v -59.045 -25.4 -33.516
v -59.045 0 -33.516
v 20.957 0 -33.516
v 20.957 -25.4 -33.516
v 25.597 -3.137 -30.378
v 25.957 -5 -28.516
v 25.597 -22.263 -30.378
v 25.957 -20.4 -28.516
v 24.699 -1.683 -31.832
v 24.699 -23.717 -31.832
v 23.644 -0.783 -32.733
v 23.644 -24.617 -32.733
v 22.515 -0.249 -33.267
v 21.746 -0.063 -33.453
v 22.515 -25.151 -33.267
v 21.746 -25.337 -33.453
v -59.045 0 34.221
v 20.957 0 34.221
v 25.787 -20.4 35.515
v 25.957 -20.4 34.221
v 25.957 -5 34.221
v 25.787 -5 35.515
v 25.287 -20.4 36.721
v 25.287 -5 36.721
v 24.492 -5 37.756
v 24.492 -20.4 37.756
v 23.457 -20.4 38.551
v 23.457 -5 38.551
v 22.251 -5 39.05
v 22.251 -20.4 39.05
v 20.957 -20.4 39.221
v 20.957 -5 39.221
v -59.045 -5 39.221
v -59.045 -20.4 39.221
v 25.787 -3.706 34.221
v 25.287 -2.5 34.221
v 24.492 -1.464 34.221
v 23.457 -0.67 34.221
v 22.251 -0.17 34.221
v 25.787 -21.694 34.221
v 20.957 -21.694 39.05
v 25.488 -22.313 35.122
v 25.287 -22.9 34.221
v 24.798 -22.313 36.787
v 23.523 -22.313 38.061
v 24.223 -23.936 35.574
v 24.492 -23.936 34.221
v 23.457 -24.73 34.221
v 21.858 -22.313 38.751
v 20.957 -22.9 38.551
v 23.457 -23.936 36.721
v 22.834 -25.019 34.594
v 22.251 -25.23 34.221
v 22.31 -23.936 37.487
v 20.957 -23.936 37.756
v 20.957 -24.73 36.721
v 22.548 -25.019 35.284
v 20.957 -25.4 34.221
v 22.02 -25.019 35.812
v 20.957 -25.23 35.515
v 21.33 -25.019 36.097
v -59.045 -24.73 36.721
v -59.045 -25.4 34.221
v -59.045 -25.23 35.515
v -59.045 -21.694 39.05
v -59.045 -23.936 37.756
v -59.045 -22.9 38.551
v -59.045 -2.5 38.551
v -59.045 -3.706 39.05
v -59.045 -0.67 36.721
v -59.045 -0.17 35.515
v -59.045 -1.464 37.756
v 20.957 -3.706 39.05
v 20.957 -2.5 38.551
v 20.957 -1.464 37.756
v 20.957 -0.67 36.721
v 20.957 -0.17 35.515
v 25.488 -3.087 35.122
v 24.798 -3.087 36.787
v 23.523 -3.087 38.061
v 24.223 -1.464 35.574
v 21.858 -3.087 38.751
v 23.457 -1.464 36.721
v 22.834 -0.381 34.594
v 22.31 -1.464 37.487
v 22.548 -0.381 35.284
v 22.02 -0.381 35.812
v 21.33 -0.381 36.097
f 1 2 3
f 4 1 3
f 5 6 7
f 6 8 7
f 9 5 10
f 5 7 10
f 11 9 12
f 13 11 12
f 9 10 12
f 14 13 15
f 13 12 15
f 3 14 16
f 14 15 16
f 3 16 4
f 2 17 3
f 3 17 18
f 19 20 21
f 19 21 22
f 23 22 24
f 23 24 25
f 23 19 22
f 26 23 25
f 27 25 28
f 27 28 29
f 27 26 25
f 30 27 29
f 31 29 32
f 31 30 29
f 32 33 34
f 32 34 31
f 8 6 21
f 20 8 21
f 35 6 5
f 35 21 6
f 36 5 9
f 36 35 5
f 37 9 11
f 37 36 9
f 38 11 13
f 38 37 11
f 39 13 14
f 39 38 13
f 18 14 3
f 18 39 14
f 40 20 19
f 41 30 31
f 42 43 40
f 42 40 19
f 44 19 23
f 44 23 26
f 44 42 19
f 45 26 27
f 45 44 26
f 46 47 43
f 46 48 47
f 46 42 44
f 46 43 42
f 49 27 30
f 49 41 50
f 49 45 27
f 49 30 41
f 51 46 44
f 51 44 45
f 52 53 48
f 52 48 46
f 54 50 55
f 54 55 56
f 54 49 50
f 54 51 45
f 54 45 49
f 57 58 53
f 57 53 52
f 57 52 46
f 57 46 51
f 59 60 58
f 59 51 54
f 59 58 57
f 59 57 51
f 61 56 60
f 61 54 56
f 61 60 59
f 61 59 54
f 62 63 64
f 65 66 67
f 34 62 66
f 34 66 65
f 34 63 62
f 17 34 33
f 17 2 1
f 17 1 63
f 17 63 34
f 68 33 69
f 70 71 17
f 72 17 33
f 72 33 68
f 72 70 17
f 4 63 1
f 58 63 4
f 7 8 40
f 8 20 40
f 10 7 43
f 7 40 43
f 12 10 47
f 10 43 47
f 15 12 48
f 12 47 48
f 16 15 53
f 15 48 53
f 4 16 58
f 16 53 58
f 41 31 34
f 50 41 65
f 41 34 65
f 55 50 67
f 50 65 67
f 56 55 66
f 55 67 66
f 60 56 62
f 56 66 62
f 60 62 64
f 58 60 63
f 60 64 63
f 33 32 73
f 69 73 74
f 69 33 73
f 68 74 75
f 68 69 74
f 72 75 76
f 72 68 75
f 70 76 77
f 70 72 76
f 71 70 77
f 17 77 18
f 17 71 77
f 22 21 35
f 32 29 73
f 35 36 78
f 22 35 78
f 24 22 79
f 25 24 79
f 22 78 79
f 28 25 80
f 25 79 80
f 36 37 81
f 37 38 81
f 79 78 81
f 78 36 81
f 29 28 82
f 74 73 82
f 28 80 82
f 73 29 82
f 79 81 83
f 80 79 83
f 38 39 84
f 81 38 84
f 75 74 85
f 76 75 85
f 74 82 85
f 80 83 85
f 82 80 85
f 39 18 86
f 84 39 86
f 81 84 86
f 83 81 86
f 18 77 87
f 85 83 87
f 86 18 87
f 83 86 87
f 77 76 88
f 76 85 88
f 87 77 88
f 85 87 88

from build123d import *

# Parameters (mm, degrees)
F0_W     = 85.001712665
F0_H     = 72.736363858
F1_DEPTH = 25.4
F2_R     = 5
F3_R     = 5


with BuildPart() as f1:
    # F0 (on Front) → F1 (new body)
    with BuildSketch(Plane.XZ):
        with Locations((-16.5439592674, 2.8524082154)):
            Rectangle(F0_W, F0_H)
    extrude(amount=F1_DEPTH)

    # F2
    f2_edges = [f1.edges().sort_by_distance(p)[0] for p in [
        (25.956897, -12.7, 39.22059),
    ]]
    fillet(f2_edges, radius=F2_R)

    # F3
    f3_edges = [f1.edges().sort_by_distance(p)[0] for p in [
        (25.956897, 0, 0.352408),
        (25.956897, -12.7, 34.22059),
        (25.956897, -12.7, -33.515774),
        (25.956897, -25.4, 0.352408),
        (20.956897, -12.7, 39.22059),
    ]]
    fillet(f3_edges, radius=F3_R)


solid = f1.part
